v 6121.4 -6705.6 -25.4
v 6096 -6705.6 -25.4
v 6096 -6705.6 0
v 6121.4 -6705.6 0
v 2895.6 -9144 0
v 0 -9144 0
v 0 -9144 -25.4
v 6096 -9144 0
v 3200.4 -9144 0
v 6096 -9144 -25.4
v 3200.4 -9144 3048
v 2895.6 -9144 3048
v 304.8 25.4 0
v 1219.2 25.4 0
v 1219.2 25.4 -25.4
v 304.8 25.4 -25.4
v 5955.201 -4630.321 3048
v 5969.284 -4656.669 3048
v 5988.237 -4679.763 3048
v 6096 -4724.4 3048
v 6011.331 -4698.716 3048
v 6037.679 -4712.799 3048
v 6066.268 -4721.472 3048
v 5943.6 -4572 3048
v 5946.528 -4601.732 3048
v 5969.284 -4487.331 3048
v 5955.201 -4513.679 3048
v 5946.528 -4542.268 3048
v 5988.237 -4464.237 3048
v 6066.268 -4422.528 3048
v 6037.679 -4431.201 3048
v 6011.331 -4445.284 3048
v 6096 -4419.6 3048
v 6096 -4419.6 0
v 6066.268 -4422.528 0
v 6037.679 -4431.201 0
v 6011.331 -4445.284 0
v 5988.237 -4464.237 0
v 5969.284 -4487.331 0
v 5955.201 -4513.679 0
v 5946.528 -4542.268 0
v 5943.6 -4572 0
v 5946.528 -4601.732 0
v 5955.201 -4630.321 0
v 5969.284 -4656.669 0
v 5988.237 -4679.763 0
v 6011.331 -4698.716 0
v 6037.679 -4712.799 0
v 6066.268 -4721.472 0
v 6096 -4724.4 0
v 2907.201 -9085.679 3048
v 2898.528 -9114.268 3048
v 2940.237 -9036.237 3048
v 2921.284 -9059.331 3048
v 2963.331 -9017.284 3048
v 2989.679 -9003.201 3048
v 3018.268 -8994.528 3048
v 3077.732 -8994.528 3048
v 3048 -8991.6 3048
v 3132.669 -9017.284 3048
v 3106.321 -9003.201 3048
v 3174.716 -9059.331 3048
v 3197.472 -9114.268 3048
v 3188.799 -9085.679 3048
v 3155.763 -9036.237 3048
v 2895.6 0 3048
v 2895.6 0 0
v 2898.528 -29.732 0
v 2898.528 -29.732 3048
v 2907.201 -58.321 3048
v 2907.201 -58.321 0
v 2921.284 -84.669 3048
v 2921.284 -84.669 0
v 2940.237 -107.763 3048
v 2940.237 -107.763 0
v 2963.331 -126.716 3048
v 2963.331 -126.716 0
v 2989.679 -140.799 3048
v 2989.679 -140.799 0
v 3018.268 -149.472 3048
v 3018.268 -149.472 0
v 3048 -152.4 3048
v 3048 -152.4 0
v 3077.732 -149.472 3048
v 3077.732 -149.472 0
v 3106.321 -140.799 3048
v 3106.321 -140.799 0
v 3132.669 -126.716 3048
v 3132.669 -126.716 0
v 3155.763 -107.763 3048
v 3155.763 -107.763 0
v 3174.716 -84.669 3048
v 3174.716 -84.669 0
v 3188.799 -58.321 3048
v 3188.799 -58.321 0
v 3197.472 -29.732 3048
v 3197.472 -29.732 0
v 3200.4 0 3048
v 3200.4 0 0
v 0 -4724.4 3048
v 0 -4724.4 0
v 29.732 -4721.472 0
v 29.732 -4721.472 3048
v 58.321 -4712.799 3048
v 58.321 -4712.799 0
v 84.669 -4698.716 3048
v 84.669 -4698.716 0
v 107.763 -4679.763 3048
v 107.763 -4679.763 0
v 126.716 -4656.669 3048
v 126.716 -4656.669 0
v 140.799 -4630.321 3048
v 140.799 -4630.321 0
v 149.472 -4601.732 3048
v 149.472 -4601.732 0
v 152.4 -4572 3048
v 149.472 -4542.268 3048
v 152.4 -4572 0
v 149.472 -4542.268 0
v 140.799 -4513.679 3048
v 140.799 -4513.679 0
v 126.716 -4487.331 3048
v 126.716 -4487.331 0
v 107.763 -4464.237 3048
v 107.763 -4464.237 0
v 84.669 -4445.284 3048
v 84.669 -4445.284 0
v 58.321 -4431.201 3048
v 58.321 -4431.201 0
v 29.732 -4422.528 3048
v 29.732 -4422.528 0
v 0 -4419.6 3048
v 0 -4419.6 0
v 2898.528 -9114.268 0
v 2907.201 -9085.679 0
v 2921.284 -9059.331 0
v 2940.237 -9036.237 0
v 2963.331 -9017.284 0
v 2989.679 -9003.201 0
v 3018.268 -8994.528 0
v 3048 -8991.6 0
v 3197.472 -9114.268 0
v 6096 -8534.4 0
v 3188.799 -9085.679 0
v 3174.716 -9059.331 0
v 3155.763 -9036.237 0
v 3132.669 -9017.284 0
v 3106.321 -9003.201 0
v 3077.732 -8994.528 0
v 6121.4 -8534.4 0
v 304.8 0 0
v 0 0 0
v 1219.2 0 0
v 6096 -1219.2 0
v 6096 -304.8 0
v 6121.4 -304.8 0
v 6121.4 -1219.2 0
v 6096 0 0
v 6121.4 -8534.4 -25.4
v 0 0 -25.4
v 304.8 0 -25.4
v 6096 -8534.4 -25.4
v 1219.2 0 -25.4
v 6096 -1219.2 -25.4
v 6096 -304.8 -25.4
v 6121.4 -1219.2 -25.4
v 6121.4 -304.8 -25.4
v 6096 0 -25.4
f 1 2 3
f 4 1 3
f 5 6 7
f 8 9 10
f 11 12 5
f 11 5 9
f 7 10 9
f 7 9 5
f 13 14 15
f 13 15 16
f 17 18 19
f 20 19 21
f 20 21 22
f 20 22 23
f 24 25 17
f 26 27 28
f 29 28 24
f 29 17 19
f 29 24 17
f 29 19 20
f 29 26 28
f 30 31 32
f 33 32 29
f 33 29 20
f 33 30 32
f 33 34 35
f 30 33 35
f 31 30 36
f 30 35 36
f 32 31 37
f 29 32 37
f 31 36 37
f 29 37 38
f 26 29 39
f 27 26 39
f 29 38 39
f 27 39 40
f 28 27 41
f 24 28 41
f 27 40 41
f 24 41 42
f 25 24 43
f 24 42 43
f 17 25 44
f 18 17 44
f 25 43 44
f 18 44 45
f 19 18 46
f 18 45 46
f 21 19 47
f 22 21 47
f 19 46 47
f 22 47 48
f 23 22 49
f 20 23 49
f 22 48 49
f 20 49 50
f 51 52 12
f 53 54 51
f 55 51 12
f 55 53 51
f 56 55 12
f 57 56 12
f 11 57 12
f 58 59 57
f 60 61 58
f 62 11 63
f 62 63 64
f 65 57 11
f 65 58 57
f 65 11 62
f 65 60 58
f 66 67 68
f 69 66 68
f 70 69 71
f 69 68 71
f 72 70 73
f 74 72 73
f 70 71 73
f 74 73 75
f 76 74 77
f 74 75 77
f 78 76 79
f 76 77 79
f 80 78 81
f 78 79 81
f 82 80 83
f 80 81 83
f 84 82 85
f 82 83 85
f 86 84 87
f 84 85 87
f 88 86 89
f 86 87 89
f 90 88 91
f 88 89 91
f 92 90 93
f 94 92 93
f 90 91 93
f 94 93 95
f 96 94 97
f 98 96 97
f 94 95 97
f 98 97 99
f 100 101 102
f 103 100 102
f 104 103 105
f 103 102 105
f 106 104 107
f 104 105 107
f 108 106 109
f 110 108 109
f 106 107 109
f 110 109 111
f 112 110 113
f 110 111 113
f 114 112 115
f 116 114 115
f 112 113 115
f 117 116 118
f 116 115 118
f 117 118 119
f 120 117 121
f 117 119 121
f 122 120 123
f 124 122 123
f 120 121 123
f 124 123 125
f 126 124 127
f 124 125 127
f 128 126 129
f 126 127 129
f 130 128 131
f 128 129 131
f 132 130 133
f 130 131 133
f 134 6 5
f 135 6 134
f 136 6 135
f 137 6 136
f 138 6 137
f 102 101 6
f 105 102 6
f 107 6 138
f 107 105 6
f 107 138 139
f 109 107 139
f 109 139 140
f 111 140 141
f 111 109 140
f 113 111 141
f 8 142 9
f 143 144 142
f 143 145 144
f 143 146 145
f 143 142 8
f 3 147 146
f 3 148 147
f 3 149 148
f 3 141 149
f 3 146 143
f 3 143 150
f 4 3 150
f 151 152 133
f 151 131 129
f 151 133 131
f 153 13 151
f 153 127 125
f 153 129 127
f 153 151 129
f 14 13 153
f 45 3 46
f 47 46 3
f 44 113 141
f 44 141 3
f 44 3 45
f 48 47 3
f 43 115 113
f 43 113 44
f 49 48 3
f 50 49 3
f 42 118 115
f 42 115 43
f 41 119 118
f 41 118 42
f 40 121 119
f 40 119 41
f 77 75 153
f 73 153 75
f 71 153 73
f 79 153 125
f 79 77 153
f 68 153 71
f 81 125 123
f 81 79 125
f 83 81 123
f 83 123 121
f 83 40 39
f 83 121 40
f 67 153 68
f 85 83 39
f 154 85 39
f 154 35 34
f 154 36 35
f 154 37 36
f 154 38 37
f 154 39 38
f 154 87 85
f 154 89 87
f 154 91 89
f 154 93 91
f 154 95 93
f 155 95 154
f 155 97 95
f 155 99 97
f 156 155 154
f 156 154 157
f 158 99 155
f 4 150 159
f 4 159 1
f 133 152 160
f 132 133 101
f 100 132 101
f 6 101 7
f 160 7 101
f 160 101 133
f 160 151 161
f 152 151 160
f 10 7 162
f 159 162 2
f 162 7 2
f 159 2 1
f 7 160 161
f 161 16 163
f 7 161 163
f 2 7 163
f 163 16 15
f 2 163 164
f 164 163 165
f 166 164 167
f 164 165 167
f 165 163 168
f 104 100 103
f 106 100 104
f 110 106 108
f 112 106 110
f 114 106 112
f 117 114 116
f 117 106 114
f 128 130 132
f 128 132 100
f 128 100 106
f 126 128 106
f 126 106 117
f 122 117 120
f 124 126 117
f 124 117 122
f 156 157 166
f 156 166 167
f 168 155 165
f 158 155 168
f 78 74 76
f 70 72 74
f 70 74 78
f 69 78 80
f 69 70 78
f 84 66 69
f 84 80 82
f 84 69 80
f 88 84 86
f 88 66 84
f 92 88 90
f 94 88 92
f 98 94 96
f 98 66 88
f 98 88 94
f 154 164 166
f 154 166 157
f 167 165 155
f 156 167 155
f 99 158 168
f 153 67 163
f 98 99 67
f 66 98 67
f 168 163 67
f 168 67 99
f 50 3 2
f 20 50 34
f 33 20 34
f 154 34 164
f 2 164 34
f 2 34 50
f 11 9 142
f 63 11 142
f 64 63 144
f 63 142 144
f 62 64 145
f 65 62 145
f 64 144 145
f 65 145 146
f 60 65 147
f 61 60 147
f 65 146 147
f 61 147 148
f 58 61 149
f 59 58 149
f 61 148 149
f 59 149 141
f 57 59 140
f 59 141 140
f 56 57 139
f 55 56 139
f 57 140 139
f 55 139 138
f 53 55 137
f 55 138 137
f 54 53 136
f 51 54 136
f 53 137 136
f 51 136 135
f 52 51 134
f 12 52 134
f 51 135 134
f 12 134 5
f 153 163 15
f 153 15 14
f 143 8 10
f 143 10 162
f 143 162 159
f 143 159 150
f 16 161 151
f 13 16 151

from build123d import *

# Parameters (mm, degrees)
F1_DEPTH = 25.4
F2_DEPTH = 3048
F3_W     = 914.4
F3_H     = 25.4
F3_W_2   = 1828.8
F4_DEPTH = 25.4
F5_W     = 914.4
F5_H     = 25.4
F6_DEPTH = 25.4


with BuildPart() as f1:
    # F0 (on Top) → F1 (new body)
    with BuildSketch(Plane.XY):
        with BuildLine():
            Line((2895.6, 0), (0, 0))
            Line((0, 0), (0, -4419.6))
            ThreePointArc((0, -4419.6), (152.4, -4572), (0, -4724.4))
            Line((0, -4724.4), (0, -9144))
            Line((0, -9144), (2895.6, -9144))
            ThreePointArc((2895.6, -9144), (3048, -8991.6), (3200.4, -9144))
            Line((3200.4, -9144), (6096, -9144))
            Line((6096, -9144), (6096, -4724.4))
            ThreePointArc((6096, -4724.4), (5943.6, -4572), (6096, -4419.6))
            Line((6096, -4419.6), (6096, 0))
            Line((6096, 0), (3200.4, 0))
            ThreePointArc((3200.4, 0), (3048, -152.4), (2895.6, 0))
        make_face()
        with BuildLine():
            Line((3200.4, 0), (2895.6, 0))
            ThreePointArc((2895.6, 0), (3048, -152.4), (3200.4, 0))
        make_face()
        with BuildLine():
            ThreePointArc((0, -4724.4), (152.4, -4572), (0, -4419.6))
            Line((0, -4419.6), (0, -4724.4))
        make_face()
        with BuildLine():
            Line((6096, -4724.4), (6096, -4419.6))
            ThreePointArc((6096, -4419.6), (5943.6, -4572), (6096, -4724.4))
        make_face()
        with BuildLine():
            ThreePointArc((3200.4, -9144), (3048, -8991.6), (2895.6, -9144))
            Line((2895.6, -9144), (3200.4, -9144))
        make_face()
    extrude(amount=-F1_DEPTH)

    # F0 (on Top) → F2 (join)
    with BuildSketch(Plane.XY):
        with BuildLine():
            ThreePointArc((0, -4724.4), (152.4, -4572), (0, -4419.6))
            Line((0, -4419.6), (0, -4724.4))
        make_face()
        with BuildLine():
            Line((6096, -4724.4), (6096, -4419.6))
            ThreePointArc((6096, -4419.6), (5943.6, -4572), (6096, -4724.4))
        make_face()
        with BuildLine():
            Line((3200.4, 0), (2895.6, 0))
            ThreePointArc((2895.6, 0), (3048, -152.4), (3200.4, 0))
        make_face()
        with BuildLine():
            ThreePointArc((3200.4, -9144), (3048, -8991.6), (2895.6, -9144))
            Line((2895.6, -9144), (3200.4, -9144))
        make_face()
    extrude(amount=F2_DEPTH)

    # F3 (on face) → F4 (join)
    with BuildSketch(Plane.YZ.offset(6096)):
        with Locations((-762, -12.7)):
            Rectangle(F3_W, F3_H)
        with Locations((-7620, -12.7)):
            Rectangle(F3_W_2, F3_H)
    extrude(amount=F4_DEPTH)

    # F5 (on face) → F6 (join)
    with BuildSketch(Plane(origin=(0, 0, 0), x_dir=(-1, 0, 0), z_dir=(0, 1, 0))):
        with Locations((-762, -12.7)):
            Rectangle(F5_W, F5_H)
    extrude(amount=F6_DEPTH)


solid = f1.part
